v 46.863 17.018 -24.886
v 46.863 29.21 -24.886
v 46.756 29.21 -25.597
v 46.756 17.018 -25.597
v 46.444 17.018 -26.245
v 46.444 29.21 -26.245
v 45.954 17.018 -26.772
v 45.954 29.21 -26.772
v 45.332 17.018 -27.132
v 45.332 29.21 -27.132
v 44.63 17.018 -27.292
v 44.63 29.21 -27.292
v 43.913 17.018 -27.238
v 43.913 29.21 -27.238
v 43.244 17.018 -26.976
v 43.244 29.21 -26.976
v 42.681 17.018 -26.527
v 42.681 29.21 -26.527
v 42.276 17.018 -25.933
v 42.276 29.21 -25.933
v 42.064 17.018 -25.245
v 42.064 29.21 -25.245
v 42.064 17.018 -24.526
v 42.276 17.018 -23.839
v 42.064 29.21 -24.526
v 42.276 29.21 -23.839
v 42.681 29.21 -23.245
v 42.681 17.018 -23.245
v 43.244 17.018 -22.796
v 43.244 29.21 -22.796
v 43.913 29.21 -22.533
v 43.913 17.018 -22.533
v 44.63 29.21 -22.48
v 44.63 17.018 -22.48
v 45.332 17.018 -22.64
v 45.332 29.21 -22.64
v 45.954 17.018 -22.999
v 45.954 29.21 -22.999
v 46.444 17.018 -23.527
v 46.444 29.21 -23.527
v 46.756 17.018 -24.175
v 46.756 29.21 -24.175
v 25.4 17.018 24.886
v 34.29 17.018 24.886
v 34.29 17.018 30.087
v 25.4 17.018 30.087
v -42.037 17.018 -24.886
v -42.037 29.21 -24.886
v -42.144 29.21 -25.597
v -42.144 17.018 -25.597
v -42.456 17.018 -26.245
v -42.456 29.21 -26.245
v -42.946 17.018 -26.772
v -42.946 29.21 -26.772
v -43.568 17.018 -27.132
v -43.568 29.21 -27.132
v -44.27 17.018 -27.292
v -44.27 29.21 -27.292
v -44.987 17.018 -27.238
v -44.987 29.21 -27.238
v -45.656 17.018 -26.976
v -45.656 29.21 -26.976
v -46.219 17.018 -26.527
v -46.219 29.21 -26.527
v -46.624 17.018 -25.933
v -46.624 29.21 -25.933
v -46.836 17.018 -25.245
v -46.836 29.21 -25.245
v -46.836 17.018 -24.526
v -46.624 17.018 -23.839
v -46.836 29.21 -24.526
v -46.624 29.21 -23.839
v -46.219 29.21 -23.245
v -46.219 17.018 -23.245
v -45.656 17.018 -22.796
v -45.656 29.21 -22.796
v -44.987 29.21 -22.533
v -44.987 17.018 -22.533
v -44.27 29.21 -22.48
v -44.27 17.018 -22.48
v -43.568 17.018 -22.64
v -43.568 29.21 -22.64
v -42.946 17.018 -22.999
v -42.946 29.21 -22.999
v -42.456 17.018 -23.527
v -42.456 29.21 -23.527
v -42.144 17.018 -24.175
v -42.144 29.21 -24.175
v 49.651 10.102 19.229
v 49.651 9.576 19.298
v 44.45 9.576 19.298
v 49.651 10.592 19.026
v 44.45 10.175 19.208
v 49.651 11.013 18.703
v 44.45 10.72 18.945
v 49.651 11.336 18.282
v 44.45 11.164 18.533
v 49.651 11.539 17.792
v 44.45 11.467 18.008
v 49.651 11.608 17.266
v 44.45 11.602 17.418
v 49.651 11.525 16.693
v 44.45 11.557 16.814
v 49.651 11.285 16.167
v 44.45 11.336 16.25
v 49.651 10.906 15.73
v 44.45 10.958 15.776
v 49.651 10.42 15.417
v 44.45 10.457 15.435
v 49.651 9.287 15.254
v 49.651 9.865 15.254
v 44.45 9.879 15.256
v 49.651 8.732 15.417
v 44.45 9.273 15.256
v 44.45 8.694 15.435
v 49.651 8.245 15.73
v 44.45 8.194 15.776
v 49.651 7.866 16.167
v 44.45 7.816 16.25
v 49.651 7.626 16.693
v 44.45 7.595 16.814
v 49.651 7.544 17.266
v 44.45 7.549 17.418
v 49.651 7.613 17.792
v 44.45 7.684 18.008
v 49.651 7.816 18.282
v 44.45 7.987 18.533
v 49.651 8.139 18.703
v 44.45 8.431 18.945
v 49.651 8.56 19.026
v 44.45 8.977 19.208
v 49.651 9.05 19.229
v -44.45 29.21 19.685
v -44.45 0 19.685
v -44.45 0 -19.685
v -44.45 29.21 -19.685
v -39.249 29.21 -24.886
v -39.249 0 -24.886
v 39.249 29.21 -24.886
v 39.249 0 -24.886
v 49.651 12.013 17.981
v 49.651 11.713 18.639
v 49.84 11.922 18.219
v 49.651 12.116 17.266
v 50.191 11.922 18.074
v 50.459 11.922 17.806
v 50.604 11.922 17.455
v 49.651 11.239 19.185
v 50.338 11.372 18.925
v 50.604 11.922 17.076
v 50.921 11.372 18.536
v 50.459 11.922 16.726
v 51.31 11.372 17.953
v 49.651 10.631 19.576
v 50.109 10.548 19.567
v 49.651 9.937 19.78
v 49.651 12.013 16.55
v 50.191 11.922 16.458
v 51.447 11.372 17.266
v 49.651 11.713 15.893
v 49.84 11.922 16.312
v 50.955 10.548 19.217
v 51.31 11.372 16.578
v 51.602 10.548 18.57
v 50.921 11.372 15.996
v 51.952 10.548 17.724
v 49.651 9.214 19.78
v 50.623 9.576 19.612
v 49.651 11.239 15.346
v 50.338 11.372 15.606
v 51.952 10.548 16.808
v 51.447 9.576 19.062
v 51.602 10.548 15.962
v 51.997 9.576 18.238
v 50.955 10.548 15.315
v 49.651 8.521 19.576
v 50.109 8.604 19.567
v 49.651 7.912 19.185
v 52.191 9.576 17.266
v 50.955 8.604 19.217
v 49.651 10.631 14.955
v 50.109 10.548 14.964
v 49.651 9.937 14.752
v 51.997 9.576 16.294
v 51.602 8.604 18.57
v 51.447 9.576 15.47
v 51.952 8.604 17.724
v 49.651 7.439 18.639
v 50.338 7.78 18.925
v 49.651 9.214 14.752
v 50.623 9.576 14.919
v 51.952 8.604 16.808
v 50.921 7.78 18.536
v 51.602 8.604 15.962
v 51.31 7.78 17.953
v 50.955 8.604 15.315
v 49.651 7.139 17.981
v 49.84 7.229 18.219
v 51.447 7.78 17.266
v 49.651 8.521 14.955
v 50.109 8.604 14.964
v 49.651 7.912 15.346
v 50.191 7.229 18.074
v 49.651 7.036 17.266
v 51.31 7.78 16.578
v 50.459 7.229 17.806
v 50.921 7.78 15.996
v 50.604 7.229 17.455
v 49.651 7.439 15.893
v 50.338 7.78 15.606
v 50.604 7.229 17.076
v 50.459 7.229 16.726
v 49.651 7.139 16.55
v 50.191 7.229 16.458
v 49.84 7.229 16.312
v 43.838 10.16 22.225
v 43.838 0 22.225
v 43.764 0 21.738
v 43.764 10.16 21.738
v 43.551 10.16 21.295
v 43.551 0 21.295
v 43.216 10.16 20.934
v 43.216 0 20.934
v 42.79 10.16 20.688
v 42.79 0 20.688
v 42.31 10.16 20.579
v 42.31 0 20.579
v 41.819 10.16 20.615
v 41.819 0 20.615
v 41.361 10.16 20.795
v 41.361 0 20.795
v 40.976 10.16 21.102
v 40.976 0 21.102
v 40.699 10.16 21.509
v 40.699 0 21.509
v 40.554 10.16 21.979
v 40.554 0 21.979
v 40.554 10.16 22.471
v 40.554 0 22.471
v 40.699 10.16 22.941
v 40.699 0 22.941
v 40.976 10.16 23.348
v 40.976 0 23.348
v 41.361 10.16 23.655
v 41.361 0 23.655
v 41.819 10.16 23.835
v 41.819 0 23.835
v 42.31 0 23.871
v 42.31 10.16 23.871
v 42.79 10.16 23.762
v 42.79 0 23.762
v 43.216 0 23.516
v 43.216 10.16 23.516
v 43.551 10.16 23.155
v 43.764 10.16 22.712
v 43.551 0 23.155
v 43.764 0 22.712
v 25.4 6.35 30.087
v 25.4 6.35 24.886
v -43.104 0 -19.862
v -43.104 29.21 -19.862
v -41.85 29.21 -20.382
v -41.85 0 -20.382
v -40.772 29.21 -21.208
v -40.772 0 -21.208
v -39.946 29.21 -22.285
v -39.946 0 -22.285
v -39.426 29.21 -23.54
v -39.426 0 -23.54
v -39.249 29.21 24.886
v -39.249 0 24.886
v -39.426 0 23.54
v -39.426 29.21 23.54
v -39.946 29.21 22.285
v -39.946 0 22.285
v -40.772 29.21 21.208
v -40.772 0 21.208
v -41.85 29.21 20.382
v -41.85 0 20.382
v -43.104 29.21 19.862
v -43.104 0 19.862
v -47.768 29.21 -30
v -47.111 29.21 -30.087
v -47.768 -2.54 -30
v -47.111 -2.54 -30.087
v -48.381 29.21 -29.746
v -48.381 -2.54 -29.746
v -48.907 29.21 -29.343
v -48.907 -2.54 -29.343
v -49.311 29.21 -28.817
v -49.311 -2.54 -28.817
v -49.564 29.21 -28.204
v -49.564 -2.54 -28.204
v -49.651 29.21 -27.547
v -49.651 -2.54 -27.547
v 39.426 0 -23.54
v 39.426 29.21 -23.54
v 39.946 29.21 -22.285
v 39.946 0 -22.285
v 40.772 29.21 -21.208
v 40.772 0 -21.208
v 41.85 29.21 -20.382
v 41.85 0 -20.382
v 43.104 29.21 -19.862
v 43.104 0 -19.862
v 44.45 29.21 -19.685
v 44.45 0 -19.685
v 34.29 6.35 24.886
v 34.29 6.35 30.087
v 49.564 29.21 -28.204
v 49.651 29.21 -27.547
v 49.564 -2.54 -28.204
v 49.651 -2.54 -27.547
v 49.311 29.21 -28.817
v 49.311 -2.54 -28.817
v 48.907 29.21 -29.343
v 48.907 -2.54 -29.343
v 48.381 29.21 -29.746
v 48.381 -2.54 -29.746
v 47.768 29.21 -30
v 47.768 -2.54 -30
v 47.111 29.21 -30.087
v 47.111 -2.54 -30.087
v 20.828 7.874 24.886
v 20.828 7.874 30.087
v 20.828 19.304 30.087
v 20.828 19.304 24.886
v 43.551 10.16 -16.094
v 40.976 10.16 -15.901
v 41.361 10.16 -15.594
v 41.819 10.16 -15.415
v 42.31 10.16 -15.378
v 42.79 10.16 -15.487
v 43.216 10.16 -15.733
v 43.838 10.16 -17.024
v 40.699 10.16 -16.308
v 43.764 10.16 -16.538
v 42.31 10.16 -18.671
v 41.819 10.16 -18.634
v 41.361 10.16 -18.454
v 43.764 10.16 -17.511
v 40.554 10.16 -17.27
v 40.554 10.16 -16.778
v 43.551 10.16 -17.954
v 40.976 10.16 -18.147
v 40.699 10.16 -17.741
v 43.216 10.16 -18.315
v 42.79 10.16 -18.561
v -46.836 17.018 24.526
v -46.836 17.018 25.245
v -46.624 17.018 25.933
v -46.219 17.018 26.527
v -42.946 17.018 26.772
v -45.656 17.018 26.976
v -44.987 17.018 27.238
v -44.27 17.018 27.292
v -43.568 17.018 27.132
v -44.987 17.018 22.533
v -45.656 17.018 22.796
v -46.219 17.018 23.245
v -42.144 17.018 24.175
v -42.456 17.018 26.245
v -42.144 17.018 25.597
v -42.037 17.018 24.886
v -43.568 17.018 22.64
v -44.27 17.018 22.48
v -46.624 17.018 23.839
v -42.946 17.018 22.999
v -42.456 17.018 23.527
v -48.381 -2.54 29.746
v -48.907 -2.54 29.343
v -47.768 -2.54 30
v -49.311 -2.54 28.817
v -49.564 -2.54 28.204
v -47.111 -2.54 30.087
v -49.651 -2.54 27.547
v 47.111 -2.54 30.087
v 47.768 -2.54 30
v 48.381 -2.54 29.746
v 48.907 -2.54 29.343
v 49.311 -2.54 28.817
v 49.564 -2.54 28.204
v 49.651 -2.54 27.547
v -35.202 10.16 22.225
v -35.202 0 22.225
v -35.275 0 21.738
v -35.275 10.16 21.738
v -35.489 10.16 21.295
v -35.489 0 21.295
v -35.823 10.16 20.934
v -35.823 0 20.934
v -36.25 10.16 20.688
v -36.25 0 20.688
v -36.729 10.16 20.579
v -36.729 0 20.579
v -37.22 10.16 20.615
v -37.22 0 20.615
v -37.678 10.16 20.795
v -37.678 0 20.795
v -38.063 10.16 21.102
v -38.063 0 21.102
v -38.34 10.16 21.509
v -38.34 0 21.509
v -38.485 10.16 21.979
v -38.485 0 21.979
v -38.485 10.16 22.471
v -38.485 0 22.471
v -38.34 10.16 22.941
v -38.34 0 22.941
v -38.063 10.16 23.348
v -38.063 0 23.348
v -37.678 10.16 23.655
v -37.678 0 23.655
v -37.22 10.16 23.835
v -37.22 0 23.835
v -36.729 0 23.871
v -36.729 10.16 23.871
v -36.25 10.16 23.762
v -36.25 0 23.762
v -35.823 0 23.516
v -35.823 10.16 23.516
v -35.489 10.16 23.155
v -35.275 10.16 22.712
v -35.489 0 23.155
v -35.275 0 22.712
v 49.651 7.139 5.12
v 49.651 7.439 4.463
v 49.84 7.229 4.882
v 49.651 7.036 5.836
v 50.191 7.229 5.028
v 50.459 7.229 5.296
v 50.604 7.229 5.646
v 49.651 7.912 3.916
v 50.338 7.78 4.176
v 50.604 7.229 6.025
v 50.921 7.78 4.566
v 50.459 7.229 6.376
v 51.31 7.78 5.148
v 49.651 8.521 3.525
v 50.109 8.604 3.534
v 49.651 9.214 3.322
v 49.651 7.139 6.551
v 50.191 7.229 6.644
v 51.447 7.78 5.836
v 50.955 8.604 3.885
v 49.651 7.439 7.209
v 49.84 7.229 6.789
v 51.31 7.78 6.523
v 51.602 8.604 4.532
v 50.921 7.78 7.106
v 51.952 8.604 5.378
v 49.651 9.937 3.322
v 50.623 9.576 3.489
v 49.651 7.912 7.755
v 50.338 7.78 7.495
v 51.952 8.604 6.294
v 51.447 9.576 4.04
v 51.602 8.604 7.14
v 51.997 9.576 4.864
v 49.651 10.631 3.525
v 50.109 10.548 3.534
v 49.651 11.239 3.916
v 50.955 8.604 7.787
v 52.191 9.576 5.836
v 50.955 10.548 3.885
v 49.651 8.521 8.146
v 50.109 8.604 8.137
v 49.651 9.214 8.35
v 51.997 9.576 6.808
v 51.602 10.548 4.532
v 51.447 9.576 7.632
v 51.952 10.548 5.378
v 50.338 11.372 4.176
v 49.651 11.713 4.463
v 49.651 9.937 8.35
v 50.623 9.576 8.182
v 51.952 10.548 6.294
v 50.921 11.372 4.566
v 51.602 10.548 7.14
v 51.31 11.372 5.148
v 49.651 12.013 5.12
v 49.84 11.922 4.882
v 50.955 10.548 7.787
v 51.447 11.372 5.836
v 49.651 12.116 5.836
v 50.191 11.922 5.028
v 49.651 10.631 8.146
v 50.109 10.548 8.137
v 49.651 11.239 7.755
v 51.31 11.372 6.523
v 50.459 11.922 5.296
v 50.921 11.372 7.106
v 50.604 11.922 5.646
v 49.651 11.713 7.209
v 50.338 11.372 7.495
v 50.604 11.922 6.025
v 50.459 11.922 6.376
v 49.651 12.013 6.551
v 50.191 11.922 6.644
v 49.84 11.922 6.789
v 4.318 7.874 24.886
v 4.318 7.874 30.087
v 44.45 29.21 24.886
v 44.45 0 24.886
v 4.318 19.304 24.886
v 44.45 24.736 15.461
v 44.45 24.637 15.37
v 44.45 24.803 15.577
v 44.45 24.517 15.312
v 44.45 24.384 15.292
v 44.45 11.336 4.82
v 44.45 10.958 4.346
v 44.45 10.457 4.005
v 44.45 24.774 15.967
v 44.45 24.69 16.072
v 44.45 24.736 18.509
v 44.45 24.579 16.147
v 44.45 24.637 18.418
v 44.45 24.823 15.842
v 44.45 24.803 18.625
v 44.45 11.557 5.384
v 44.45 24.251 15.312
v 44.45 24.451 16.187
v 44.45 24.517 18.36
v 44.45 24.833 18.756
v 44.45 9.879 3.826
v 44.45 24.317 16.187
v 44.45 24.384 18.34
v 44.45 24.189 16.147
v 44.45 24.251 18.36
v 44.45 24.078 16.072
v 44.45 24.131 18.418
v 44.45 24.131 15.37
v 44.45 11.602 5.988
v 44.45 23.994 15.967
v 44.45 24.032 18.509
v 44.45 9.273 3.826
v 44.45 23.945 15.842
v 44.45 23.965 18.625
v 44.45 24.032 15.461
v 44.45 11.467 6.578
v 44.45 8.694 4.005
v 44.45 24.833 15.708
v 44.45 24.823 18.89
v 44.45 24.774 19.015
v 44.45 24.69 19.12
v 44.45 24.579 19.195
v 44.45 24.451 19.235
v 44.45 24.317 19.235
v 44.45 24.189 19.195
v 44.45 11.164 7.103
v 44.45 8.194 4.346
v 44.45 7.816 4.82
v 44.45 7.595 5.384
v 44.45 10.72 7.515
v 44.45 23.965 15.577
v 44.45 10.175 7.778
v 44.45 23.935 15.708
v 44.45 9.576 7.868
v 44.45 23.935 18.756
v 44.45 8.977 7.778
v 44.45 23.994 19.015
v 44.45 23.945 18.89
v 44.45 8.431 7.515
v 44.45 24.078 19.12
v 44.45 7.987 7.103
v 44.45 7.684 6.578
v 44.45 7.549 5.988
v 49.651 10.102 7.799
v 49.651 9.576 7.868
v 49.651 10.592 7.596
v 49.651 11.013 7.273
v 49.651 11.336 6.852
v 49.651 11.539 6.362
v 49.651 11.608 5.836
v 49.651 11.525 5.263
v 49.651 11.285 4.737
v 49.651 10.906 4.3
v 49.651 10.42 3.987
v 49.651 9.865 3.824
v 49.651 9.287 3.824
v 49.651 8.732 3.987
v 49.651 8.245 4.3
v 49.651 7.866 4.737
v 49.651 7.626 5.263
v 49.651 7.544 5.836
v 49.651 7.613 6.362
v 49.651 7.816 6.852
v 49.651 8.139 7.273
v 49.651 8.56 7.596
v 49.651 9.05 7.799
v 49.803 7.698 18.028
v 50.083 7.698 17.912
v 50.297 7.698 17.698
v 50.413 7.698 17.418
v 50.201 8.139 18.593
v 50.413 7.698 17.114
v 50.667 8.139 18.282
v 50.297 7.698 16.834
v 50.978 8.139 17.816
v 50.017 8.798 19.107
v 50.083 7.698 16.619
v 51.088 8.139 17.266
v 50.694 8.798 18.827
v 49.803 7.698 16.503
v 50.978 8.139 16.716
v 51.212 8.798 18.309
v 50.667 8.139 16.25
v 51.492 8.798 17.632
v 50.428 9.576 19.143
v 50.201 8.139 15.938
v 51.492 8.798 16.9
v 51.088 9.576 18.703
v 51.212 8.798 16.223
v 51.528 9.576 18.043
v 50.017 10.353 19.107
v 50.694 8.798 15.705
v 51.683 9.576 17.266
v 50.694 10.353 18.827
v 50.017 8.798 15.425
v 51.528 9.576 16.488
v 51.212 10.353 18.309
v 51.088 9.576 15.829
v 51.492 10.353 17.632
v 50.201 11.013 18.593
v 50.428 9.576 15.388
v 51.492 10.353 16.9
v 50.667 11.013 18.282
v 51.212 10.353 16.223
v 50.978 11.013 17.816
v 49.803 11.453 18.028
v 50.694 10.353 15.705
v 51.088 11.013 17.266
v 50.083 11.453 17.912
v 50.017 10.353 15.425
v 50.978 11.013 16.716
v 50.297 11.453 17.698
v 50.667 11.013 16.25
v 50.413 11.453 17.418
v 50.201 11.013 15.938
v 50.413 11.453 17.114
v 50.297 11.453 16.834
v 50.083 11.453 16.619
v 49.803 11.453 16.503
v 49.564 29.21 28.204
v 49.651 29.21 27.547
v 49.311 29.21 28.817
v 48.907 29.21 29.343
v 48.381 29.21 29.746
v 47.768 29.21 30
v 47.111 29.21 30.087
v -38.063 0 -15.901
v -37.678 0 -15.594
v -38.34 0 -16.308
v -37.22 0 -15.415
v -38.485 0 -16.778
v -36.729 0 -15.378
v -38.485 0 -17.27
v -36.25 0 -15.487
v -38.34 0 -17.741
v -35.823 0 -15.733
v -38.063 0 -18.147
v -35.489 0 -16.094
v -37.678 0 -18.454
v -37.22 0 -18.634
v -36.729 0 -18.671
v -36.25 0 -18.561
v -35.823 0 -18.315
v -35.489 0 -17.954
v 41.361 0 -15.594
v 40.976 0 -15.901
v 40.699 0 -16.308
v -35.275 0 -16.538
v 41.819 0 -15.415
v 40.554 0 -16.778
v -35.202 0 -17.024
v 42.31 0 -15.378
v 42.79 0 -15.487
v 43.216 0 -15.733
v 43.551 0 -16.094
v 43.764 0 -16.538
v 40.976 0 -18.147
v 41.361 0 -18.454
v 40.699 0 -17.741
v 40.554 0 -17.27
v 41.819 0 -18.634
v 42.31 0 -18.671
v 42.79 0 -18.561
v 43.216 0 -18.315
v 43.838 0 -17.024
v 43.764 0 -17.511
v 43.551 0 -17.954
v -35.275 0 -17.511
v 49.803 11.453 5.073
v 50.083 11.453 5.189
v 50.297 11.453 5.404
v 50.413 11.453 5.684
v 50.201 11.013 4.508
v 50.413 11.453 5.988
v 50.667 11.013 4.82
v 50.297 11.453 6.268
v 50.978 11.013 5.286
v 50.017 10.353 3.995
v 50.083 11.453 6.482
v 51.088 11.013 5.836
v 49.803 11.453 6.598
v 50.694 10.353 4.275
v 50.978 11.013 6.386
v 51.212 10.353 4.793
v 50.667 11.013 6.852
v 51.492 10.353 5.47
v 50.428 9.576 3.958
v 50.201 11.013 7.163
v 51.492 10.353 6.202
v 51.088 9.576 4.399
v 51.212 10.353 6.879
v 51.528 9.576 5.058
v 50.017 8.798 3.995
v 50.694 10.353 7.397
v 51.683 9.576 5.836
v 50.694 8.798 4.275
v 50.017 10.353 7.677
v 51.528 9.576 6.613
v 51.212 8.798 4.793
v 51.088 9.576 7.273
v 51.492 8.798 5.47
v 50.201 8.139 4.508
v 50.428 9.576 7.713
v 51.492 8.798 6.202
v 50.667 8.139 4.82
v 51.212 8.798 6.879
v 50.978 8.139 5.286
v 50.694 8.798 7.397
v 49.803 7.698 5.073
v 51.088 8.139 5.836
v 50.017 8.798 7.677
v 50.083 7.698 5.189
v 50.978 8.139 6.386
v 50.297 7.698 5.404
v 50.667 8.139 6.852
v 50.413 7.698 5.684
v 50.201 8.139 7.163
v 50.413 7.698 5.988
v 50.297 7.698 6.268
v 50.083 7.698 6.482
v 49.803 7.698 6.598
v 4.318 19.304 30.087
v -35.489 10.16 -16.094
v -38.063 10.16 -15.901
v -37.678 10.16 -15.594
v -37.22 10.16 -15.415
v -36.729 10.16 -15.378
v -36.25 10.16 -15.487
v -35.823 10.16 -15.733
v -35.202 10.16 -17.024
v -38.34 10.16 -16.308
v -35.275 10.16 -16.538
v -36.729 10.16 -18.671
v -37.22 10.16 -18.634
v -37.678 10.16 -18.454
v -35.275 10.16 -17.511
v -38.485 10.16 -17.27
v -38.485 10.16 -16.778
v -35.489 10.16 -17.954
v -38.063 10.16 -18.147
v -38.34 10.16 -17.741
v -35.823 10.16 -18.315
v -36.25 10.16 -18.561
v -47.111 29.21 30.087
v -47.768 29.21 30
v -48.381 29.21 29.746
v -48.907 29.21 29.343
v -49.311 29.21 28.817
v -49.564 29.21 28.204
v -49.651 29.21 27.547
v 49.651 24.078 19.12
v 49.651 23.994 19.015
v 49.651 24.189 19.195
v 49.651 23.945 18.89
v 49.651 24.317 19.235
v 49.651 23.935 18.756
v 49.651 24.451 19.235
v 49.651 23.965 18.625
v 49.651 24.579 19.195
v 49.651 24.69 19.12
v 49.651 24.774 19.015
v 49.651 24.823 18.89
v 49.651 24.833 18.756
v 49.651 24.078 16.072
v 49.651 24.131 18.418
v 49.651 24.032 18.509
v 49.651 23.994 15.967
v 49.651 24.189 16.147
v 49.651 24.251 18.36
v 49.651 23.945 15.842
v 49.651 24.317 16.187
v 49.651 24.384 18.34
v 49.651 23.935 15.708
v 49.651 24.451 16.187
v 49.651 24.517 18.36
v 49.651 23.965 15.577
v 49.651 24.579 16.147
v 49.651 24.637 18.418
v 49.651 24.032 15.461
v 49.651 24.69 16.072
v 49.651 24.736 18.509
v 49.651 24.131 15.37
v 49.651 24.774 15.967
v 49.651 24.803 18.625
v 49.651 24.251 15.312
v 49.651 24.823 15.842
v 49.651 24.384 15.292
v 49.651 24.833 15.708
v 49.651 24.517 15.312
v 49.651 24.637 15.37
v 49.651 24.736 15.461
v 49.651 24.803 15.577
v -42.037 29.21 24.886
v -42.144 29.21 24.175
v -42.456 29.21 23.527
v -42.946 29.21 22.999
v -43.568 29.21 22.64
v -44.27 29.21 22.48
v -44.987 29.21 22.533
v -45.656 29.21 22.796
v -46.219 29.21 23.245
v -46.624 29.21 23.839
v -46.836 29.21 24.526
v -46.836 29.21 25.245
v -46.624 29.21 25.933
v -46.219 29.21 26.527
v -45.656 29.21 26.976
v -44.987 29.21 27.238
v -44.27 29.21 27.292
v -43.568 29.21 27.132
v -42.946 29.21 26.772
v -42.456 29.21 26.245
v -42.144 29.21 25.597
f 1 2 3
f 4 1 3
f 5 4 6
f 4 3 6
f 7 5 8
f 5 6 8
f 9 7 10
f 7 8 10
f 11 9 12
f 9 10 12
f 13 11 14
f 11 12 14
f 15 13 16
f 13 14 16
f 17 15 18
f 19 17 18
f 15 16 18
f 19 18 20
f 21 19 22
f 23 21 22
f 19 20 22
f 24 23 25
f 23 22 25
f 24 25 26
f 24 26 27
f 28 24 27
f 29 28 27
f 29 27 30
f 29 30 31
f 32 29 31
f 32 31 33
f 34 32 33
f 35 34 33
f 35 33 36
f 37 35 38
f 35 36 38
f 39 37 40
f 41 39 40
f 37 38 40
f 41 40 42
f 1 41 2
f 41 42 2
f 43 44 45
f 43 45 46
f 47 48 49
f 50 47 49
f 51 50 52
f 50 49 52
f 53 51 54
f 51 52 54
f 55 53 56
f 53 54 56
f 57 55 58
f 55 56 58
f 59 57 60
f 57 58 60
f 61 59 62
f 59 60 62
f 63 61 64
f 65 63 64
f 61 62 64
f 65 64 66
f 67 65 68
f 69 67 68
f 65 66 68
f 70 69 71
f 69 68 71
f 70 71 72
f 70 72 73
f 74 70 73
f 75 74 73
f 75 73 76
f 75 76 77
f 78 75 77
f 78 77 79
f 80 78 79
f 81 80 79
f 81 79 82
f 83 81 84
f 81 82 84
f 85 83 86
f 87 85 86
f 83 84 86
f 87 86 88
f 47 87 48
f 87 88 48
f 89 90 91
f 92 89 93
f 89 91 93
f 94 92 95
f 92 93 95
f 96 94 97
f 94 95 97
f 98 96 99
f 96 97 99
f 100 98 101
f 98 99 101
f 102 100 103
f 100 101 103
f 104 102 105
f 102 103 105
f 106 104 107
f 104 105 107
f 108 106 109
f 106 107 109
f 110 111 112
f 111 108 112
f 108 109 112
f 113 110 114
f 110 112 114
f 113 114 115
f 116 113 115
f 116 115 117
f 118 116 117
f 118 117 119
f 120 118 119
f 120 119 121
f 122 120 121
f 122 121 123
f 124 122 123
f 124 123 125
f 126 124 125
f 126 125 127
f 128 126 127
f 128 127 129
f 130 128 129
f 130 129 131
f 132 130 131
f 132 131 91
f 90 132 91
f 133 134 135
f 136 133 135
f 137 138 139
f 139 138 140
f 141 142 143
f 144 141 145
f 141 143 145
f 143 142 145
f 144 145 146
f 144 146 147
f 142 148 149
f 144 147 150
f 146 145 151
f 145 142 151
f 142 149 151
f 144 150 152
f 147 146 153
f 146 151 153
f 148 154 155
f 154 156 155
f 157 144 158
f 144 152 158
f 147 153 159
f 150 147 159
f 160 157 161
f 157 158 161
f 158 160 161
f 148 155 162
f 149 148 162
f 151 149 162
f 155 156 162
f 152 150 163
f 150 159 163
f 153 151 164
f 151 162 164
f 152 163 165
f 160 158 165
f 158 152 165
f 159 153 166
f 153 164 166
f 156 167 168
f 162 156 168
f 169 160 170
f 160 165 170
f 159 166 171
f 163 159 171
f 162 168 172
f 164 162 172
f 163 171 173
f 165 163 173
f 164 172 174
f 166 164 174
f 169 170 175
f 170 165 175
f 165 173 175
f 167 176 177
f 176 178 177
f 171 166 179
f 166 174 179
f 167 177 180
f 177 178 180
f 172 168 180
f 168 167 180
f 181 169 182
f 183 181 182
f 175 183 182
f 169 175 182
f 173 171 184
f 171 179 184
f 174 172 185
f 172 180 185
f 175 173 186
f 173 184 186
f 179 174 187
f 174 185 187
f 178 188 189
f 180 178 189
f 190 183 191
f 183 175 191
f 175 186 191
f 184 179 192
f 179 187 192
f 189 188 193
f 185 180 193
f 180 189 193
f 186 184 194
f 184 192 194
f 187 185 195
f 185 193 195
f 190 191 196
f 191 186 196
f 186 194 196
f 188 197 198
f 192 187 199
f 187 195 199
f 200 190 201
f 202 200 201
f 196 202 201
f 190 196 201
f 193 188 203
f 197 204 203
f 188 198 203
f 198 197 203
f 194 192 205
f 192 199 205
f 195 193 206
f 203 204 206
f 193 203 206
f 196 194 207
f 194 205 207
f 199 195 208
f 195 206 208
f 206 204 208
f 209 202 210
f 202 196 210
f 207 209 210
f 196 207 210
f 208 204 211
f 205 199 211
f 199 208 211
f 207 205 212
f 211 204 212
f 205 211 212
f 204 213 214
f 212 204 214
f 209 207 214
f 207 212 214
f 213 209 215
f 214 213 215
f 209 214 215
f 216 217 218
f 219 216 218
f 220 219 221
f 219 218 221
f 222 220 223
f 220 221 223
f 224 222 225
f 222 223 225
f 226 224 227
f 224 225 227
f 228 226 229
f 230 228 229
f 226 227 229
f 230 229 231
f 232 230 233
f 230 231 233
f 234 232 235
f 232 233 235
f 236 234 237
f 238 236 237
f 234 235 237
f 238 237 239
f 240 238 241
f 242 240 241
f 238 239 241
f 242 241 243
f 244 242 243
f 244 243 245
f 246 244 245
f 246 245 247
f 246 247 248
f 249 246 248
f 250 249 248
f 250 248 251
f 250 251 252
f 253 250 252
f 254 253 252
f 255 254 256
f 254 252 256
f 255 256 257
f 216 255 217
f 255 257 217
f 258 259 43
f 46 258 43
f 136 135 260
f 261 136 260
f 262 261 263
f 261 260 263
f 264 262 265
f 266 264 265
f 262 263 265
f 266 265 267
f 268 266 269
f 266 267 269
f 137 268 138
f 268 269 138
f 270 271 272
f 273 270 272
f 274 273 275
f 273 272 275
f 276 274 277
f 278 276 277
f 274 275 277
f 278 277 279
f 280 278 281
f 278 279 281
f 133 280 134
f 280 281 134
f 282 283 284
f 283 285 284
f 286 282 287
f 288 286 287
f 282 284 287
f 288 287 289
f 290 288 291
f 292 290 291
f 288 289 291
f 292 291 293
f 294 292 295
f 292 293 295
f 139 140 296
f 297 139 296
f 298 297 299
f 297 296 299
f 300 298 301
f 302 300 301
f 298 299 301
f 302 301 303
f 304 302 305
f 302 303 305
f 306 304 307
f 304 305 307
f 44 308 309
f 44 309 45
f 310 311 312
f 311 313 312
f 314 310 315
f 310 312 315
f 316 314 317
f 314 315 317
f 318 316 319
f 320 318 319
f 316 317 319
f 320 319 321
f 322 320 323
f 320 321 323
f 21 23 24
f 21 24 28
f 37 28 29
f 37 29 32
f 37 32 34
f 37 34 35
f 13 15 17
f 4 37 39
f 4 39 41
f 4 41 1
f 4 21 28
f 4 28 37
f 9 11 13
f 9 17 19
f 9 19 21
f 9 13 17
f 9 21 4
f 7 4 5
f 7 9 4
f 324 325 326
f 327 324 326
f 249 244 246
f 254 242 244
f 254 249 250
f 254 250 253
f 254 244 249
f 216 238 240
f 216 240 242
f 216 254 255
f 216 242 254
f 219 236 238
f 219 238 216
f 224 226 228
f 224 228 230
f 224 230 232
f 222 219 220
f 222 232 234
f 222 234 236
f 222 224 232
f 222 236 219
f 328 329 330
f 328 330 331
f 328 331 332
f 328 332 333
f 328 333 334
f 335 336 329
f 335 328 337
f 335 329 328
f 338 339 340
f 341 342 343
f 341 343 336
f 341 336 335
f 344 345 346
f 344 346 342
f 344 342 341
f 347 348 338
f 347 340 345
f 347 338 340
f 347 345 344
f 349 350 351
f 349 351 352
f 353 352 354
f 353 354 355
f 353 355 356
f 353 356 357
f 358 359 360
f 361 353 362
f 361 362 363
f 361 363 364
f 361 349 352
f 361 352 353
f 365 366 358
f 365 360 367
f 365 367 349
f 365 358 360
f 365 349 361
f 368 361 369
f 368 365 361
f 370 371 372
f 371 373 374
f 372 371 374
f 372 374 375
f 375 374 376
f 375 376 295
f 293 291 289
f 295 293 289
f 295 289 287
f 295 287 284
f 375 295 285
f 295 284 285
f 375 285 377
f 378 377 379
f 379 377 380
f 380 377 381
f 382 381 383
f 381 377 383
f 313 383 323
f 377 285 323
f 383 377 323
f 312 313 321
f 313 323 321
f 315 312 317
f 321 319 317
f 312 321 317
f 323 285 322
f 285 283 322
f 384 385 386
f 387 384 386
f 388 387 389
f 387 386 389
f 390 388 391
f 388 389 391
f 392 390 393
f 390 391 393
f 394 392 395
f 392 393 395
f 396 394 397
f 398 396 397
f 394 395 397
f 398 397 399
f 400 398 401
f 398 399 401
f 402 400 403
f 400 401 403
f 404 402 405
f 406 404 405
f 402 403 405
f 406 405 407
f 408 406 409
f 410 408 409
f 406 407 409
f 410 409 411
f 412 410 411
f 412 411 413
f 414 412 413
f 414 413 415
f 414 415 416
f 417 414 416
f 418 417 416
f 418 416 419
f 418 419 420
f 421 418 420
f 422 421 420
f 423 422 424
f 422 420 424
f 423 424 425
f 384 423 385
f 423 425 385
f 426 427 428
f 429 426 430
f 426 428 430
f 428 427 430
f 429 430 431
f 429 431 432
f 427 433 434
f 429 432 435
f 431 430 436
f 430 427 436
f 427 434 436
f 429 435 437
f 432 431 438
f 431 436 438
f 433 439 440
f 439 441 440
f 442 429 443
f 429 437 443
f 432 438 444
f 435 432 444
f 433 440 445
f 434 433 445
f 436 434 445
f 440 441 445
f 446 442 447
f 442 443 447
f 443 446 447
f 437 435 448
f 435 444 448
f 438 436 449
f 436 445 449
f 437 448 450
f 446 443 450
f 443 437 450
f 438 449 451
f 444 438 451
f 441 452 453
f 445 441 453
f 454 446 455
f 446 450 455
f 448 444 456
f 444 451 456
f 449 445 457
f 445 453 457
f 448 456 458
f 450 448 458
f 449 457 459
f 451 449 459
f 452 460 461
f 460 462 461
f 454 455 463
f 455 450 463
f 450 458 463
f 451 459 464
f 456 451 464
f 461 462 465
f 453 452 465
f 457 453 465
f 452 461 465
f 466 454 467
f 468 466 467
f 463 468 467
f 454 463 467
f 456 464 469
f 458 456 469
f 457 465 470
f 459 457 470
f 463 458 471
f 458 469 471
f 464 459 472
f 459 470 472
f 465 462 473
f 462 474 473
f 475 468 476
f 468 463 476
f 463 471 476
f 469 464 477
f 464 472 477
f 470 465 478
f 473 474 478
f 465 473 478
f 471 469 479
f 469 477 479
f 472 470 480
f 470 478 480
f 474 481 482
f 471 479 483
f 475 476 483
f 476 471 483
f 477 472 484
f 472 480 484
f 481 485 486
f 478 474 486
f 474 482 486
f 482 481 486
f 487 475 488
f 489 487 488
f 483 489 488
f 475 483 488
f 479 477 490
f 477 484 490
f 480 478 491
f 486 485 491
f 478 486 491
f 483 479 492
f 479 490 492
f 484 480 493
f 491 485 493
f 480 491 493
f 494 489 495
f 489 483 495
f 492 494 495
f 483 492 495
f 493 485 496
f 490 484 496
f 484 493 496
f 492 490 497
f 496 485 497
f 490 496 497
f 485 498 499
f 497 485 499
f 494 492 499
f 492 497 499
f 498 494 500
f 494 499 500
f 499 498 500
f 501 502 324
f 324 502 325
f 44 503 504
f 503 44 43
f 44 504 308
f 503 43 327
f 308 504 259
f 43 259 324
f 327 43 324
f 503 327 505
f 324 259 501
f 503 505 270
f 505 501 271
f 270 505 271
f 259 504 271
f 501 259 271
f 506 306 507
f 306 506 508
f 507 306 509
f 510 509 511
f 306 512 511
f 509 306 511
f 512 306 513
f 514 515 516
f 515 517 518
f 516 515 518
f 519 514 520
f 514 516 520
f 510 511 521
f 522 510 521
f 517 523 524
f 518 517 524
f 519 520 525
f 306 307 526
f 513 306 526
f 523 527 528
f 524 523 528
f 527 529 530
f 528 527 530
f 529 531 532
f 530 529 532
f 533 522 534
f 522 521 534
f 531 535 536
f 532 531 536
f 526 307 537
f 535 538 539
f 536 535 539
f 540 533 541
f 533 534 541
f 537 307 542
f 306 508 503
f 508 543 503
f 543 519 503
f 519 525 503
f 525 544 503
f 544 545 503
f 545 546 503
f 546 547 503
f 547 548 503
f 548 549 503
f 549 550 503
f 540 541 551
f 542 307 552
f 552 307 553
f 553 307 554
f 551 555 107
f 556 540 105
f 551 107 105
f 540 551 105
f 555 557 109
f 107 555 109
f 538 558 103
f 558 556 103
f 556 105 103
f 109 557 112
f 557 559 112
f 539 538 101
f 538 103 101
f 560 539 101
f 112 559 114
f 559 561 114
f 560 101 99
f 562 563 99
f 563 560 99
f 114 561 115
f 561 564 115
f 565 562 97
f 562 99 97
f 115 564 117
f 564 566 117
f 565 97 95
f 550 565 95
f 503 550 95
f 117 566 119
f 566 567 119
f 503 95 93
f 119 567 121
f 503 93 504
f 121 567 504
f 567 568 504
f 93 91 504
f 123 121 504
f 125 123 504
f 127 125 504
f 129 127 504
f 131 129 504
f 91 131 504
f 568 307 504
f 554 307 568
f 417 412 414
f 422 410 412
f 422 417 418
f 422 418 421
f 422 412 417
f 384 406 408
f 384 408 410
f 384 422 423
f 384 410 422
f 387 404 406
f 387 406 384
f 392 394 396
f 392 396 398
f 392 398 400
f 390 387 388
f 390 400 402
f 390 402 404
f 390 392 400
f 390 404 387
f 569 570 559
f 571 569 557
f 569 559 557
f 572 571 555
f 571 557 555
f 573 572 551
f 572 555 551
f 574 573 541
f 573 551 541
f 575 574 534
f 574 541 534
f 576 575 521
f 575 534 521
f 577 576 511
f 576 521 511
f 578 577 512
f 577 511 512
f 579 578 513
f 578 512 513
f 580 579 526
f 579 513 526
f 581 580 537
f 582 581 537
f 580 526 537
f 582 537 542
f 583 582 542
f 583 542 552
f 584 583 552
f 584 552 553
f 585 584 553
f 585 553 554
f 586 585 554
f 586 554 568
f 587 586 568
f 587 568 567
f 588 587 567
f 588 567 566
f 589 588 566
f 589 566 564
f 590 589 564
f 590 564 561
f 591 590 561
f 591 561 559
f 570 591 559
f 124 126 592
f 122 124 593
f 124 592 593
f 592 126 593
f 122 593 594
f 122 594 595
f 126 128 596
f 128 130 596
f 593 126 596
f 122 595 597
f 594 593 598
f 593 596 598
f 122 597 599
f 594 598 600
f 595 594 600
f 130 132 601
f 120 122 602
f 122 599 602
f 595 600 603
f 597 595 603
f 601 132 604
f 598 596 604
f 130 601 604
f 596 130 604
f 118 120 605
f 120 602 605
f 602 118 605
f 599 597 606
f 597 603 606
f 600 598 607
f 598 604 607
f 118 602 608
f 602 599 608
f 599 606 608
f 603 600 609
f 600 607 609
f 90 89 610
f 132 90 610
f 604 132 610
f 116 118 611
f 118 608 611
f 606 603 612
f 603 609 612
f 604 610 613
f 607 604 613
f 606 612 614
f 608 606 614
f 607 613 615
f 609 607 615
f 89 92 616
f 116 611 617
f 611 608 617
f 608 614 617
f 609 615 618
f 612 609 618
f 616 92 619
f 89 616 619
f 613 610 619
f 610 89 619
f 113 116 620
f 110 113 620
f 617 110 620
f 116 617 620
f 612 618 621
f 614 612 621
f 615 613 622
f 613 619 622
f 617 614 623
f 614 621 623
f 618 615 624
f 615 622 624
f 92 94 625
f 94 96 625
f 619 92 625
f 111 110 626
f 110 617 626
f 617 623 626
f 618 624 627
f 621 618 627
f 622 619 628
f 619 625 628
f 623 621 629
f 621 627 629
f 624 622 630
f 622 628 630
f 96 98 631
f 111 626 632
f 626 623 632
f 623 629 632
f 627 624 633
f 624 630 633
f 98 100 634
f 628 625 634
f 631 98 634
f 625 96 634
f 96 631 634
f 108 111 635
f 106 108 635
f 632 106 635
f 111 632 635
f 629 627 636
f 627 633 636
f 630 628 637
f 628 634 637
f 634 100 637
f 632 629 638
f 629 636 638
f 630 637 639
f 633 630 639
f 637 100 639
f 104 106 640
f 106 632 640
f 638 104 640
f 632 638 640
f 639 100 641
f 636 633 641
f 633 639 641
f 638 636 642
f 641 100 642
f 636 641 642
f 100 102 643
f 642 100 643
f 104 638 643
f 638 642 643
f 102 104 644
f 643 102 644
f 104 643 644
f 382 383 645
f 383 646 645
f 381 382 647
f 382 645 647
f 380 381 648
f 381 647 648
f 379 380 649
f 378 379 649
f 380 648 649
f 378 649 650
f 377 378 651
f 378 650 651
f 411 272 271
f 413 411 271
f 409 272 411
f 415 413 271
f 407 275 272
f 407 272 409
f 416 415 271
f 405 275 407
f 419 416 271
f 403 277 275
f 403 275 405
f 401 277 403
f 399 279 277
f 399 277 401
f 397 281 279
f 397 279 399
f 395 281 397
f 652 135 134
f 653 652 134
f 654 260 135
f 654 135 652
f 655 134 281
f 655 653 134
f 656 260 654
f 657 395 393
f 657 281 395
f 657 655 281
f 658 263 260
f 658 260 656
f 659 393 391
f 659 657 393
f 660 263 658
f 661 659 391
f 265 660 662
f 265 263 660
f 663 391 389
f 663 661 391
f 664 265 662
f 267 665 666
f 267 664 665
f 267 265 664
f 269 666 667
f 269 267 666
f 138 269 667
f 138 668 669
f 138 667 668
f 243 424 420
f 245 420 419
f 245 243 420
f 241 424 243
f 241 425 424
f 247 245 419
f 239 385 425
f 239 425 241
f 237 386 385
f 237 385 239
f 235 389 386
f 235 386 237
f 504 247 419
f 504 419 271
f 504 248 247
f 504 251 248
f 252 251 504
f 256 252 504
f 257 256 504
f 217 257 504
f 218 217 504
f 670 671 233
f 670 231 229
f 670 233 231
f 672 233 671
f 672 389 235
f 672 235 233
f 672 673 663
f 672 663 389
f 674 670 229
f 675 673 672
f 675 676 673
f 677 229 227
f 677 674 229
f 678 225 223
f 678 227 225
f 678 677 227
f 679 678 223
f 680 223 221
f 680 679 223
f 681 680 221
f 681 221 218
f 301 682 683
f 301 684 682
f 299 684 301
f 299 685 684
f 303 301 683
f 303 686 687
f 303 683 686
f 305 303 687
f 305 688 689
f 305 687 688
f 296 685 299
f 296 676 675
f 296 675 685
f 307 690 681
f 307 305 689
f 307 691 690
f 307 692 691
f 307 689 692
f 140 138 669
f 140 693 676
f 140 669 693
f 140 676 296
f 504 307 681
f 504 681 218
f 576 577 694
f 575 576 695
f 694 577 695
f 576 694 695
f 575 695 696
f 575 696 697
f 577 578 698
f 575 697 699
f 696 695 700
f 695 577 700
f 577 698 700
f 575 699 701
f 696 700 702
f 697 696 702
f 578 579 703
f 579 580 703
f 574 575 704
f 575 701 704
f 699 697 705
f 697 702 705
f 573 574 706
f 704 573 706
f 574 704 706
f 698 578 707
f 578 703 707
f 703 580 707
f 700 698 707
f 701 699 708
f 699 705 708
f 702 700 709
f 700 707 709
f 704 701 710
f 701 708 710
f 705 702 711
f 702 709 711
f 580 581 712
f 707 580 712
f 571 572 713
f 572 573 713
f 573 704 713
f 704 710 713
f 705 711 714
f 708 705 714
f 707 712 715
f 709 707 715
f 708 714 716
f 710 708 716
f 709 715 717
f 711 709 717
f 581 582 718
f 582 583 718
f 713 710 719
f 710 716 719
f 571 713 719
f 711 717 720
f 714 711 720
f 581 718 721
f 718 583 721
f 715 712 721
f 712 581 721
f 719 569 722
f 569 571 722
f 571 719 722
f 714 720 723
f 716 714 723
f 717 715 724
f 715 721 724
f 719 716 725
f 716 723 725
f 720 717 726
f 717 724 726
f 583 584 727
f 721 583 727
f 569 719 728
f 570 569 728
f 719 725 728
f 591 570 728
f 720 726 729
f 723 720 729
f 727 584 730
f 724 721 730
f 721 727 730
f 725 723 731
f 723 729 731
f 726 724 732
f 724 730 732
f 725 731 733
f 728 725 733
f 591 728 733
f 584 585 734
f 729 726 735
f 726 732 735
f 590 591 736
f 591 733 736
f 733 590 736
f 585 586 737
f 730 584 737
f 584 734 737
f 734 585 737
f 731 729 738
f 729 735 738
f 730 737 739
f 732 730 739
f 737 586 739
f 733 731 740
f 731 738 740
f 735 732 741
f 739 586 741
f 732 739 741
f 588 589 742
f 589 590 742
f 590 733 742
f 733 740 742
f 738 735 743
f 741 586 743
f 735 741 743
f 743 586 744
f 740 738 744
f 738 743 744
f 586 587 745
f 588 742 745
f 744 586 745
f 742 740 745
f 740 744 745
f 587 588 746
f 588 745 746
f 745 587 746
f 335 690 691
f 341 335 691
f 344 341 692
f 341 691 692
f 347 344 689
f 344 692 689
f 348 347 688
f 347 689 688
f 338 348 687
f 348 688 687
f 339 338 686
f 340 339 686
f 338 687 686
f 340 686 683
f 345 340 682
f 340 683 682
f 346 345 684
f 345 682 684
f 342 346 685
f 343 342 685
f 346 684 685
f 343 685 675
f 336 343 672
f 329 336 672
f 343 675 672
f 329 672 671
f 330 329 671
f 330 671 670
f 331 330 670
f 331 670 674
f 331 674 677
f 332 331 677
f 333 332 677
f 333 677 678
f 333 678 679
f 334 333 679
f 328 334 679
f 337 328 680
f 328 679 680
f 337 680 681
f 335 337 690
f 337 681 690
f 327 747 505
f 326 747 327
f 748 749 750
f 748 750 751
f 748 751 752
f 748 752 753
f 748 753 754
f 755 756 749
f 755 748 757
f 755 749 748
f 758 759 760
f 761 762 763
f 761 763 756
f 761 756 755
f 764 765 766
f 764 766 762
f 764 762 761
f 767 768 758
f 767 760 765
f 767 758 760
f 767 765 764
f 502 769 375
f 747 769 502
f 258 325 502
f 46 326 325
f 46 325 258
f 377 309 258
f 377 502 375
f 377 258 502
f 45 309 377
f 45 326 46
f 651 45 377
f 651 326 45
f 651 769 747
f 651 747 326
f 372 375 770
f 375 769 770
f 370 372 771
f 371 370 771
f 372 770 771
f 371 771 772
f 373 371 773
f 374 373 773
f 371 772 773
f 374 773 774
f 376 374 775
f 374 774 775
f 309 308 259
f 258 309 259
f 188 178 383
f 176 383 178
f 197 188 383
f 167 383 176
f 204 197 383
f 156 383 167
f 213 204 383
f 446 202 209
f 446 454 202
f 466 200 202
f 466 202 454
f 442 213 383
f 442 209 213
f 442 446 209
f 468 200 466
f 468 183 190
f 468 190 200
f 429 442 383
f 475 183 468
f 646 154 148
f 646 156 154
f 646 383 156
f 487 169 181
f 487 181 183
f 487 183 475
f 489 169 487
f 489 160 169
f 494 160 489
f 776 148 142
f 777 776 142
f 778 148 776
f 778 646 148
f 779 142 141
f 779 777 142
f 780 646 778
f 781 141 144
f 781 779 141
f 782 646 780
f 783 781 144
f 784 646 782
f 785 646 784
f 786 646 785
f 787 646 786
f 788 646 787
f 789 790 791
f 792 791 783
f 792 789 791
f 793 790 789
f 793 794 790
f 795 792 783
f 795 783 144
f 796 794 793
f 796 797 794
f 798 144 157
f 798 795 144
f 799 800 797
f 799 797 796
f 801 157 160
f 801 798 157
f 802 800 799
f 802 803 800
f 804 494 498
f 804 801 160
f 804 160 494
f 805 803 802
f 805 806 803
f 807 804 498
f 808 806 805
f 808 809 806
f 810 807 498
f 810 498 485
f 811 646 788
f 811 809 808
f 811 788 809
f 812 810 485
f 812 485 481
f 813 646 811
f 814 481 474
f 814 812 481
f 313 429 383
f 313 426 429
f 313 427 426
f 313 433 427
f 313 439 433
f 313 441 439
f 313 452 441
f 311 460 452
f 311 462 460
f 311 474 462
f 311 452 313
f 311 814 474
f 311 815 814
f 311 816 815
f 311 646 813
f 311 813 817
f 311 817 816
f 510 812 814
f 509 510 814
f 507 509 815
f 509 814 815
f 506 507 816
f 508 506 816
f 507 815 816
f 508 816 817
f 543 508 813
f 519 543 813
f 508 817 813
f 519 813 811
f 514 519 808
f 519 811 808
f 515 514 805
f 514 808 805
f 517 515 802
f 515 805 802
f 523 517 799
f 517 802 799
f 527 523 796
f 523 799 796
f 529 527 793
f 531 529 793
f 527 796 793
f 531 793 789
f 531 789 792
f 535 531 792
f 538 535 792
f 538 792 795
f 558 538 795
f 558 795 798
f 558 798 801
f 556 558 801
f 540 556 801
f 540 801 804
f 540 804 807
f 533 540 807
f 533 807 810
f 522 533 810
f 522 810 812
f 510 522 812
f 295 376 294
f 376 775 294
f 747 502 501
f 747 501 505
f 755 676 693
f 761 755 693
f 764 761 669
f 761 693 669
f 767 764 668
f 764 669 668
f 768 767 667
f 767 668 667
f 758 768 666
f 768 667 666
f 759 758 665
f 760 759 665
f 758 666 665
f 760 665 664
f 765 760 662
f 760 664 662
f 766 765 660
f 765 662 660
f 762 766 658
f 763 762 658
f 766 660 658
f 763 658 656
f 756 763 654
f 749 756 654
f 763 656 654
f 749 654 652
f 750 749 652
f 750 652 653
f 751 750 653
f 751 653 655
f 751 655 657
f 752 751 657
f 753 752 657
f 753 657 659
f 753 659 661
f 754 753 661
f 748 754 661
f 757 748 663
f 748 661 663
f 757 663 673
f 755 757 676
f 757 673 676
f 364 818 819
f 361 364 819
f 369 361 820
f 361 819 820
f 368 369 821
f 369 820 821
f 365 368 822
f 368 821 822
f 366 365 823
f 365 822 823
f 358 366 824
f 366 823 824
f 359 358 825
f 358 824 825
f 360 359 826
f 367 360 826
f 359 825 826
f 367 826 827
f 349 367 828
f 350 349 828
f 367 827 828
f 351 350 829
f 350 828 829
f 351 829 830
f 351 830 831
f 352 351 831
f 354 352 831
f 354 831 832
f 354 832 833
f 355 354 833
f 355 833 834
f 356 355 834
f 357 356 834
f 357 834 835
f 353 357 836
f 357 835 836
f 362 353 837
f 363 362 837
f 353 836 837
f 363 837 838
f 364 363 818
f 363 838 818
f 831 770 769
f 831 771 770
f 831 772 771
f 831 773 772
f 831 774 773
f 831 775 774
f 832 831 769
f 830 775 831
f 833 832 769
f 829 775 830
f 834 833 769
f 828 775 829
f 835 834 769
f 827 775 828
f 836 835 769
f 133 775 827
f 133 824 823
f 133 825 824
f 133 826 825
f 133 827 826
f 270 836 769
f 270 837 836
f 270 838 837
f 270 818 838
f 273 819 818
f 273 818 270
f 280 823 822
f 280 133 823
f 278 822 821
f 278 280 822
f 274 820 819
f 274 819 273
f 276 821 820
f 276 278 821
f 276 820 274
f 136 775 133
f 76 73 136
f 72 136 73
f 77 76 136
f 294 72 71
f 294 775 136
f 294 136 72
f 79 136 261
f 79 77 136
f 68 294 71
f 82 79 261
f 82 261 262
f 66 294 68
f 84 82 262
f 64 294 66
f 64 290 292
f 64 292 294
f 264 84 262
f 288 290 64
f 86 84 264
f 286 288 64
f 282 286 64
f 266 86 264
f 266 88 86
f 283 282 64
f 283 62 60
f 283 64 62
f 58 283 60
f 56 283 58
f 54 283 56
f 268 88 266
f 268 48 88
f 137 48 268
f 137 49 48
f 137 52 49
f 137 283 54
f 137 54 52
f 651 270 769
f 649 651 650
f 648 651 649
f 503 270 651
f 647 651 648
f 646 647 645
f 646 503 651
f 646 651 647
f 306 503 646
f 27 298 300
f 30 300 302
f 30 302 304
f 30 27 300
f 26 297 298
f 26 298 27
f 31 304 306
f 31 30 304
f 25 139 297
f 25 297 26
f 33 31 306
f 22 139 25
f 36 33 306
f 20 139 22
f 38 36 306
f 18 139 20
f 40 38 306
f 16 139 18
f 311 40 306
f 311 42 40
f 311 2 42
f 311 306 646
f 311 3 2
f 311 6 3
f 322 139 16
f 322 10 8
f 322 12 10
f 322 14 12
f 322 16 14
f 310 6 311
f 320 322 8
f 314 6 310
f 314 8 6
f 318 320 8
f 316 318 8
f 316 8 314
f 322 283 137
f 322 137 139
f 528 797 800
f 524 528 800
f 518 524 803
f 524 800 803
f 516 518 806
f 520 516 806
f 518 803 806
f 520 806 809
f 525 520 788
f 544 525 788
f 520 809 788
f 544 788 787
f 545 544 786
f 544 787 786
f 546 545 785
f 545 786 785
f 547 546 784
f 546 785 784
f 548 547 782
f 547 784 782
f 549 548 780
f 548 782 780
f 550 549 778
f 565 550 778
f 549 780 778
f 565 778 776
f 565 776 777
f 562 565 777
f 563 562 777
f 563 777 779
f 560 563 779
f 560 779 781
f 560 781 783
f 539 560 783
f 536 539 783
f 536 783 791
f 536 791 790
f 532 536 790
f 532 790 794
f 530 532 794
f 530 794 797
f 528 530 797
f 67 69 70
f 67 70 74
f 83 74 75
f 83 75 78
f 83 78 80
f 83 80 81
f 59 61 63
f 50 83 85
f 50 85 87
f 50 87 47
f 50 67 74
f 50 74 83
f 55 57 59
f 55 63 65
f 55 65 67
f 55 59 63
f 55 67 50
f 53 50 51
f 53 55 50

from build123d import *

# Parameters (mm, degrees)
SKETCH1_W           = 99.30160125
SKETCH1_H           = 60.173202502
BOSS_EXTRUDE1_DEPTH = 29.21
SKETCH1_23_W        = 99.30160125
SKETCH1_23_H        = 60.173202502
BOSS_EXTRUDE2_DEPTH = 2.54
CUT_EXTRUDE1_START  = 29.21
SKETCH1_25_R        = 2.413
CUT_EXTRUDE1_DEPTH  = 12.192
SKETCH1_28_R        = 1.651
BOSS_EXTRUDE5_DEPTH = 10.16
SKETCH6_W           = 8.89
SKETCH6_H           = 10.668
CUT_EXTRUDE2_DEPTH  = 10.16
SKETCH8_W           = 16.51
SKETCH8_H           = 11.43
CUT_EXTRUDE4_DEPTH  = 10.16
SKETCH10_R          = 2.032
CUT_EXTRUDE7_DEPTH  = 6.200800625
REVOLVE1_ANGLE      = 180
REVOLVE2_ANGLE      = 180
SKETCH13_R          = 0.45
CUT_EXTRUDE8_DEPTH  = 7.62
FILLET2_R           = 2.54


with BuildPart() as part:
    # Sketch1 → Boss-Extrude1 (new body)
    with BuildSketch(Plane(origin=(0, 0, 0), x_dir=(1, 0, 0), z_dir=(0, 1, 0))):
        Rectangle(SKETCH1_W, SKETCH1_H)
        with BuildLine():
            ThreePointArc((-44.45, 19.685), (-40.77247861, 21.208279236), (-39.249199375, 24.885800625))
            Line((-39.249199375, 24.885800625), (39.249199375, 24.885800625))
            ThreePointArc((39.249199375, 24.885800625), (40.77247861, 21.208279236), (44.45, 19.685))
            Line((44.45, 19.685), (44.45, -24.885800625))
            Line((44.45, -24.885800625), (-39.249199375, -24.885800625))
            ThreePointArc((-39.249199375, -24.885800625), (-40.77247861, -21.208279236), (-44.45, -19.685))
            Line((-44.45, -19.685), (-44.45, 19.685))
        make_face(mode=Mode.SUBTRACT)
    extrude(amount=BOSS_EXTRUDE1_DEPTH)

    # Sketch1<23> → Boss-Extrude2 (add)
    with BuildSketch(Plane(origin=(0, 0, 0), x_dir=(1, 0, 0), z_dir=(0, 1, 0))):
        Rectangle(SKETCH1_23_W, SKETCH1_23_H)
    extrude(amount=-BOSS_EXTRUDE2_DEPTH)

    # Sketch1<25> → Cut-Extrude1 (cut)
    with BuildSketch(Plane(origin=(0, 0, 0), x_dir=(1, 0, 0), z_dir=(0, 1, 0)).offset(CUT_EXTRUDE1_START)):
        with Locations((-44.45, 24.885800625)):
            Circle(SKETCH1_25_R)
        with Locations((44.45, 24.885800625)):
            Circle(SKETCH1_25_R)
        with Locations((-44.45, -24.885800625)):
            Circle(SKETCH1_25_R)
    extrude(amount=-CUT_EXTRUDE1_DEPTH, mode=Mode.SUBTRACT)

    # Sketch1<28> → Boss-Extrude5 (add)
    with BuildSketch(Plane(origin=(0, 0, 0), x_dir=(1, 0, 0), z_dir=(0, 1, 0))):
        with Locations((42.186757457, 17.024199375)):
            Circle(SKETCH1_28_R)
        with Locations((-36.852757457, -22.225)):
            Circle(SKETCH1_28_R)
        with Locations((-36.852757457, 17.024199375)):
            Circle(SKETCH1_28_R)
        with Locations((42.186757457, -22.225)):
            Circle(SKETCH1_28_R)
    extrude(amount=BOSS_EXTRUDE5_DEPTH)

    # Sketch6 → Cut-Extrude2 (cut)
    with BuildSketch(Plane(origin=(0, 0, 24.885800625), x_dir=(-1, 0, 0), z_dir=(0, 0, -1))):
        with Locations((-29.845, 11.684)):
            Rectangle(SKETCH6_W, SKETCH6_H)
    extrude(amount=-CUT_EXTRUDE2_DEPTH, mode=Mode.SUBTRACT)

    # Sketch8 → Cut-Extrude4 (cut)
    with BuildSketch(Plane.XY.offset(30.086601251)):
        with Locations((12.573, 13.589)):
            Rectangle(SKETCH8_W, SKETCH8_H)
    extrude(amount=-CUT_EXTRUDE4_DEPTH, mode=Mode.SUBTRACT)

    # Sketch10 → Cut-Extrude7 (cut, through all)
    with BuildSketch(Plane.ZY.offset(-44.45)):
        with Locations((17.265800625, 9.5758)):
            Circle(SKETCH10_R)
        with Locations((5.835800625, 9.5758)):
            Circle(SKETCH10_R)
    extrude(amount=-CUT_EXTRUDE7_DEPTH, mode=Mode.SUBTRACT)

    # Sketch12 → Revolve1 (revolve)
    with BuildSketch(Plane(origin=(49.650800625, 0, 0), x_dir=(0, 0, -1), z_dir=(1, 0, 0))):
        with BuildLine():
            Line((-17.265800625, 11.6078), (-17.265800625, 12.1158))
            ThreePointArc((-17.265800625, 12.1158), (-19.805800625, 9.5758), (-17.265800625, 7.0358))
            Line((-17.265800625, 7.0358), (-17.265800625, 7.5438))
            ThreePointArc((-17.265800625, 7.5438), (-19.297800625, 9.5758), (-17.265800625, 11.6078))
        make_face()
    revolve(axis=Axis((49.650800625, 12.1158, 17.265800625), (0, 1, 0)), revolution_arc=REVOLVE1_ANGLE)

    # Sketch12<4> → Revolve2 (revolve)
    with BuildSketch(Plane(origin=(49.650800625, 0, 0), x_dir=(0, 0, -1), z_dir=(1, 0, 0))):
        with BuildLine():
            ThreePointArc((-5.835800625, 7.0358), (-3.295800625, 9.5758), (-5.835800625, 12.1158))
            Line((-5.835800625, 12.1158), (-5.835800625, 11.6078))
            ThreePointArc((-5.835800625, 11.6078), (-3.803800625, 9.5758), (-5.835800625, 7.5438))
            Line((-5.835800625, 7.5438), (-5.835800625, 7.0358))
        make_face()
    revolve(axis=Axis((49.650800625, 12.1158, 5.835800625), (0, -1, 0)), revolution_arc=REVOLVE2_ANGLE)

    # Sketch13 → Cut-Extrude8 (cut)
    with BuildSketch(Plane(origin=(49.650800625, 0, 0), x_dir=(0, 0, -1), z_dir=(1, 0, 0))):
        with Locations((-18.789800625, 24.384)):
            Circle(SKETCH13_R)
        with Locations((-15.741800625, 24.384)):
            Circle(SKETCH13_R)
    extrude(amount=-CUT_EXTRUDE8_DEPTH, mode=Mode.SUBTRACT)

    # Fillet2
    fillet2_edges = [part.edges().sort_by_distance(p)[0] for p in [
        (-49.650800625, 13.335, -30.086601251),
        (49.650800625, 13.335, -30.086601251),
        (49.650800625, 13.335, 30.086601251),
        (-49.650800625, 13.335, 30.086601251),
    ]]
    fillet(fillet2_edges, radius=FILLET2_R)


solid = part.part
